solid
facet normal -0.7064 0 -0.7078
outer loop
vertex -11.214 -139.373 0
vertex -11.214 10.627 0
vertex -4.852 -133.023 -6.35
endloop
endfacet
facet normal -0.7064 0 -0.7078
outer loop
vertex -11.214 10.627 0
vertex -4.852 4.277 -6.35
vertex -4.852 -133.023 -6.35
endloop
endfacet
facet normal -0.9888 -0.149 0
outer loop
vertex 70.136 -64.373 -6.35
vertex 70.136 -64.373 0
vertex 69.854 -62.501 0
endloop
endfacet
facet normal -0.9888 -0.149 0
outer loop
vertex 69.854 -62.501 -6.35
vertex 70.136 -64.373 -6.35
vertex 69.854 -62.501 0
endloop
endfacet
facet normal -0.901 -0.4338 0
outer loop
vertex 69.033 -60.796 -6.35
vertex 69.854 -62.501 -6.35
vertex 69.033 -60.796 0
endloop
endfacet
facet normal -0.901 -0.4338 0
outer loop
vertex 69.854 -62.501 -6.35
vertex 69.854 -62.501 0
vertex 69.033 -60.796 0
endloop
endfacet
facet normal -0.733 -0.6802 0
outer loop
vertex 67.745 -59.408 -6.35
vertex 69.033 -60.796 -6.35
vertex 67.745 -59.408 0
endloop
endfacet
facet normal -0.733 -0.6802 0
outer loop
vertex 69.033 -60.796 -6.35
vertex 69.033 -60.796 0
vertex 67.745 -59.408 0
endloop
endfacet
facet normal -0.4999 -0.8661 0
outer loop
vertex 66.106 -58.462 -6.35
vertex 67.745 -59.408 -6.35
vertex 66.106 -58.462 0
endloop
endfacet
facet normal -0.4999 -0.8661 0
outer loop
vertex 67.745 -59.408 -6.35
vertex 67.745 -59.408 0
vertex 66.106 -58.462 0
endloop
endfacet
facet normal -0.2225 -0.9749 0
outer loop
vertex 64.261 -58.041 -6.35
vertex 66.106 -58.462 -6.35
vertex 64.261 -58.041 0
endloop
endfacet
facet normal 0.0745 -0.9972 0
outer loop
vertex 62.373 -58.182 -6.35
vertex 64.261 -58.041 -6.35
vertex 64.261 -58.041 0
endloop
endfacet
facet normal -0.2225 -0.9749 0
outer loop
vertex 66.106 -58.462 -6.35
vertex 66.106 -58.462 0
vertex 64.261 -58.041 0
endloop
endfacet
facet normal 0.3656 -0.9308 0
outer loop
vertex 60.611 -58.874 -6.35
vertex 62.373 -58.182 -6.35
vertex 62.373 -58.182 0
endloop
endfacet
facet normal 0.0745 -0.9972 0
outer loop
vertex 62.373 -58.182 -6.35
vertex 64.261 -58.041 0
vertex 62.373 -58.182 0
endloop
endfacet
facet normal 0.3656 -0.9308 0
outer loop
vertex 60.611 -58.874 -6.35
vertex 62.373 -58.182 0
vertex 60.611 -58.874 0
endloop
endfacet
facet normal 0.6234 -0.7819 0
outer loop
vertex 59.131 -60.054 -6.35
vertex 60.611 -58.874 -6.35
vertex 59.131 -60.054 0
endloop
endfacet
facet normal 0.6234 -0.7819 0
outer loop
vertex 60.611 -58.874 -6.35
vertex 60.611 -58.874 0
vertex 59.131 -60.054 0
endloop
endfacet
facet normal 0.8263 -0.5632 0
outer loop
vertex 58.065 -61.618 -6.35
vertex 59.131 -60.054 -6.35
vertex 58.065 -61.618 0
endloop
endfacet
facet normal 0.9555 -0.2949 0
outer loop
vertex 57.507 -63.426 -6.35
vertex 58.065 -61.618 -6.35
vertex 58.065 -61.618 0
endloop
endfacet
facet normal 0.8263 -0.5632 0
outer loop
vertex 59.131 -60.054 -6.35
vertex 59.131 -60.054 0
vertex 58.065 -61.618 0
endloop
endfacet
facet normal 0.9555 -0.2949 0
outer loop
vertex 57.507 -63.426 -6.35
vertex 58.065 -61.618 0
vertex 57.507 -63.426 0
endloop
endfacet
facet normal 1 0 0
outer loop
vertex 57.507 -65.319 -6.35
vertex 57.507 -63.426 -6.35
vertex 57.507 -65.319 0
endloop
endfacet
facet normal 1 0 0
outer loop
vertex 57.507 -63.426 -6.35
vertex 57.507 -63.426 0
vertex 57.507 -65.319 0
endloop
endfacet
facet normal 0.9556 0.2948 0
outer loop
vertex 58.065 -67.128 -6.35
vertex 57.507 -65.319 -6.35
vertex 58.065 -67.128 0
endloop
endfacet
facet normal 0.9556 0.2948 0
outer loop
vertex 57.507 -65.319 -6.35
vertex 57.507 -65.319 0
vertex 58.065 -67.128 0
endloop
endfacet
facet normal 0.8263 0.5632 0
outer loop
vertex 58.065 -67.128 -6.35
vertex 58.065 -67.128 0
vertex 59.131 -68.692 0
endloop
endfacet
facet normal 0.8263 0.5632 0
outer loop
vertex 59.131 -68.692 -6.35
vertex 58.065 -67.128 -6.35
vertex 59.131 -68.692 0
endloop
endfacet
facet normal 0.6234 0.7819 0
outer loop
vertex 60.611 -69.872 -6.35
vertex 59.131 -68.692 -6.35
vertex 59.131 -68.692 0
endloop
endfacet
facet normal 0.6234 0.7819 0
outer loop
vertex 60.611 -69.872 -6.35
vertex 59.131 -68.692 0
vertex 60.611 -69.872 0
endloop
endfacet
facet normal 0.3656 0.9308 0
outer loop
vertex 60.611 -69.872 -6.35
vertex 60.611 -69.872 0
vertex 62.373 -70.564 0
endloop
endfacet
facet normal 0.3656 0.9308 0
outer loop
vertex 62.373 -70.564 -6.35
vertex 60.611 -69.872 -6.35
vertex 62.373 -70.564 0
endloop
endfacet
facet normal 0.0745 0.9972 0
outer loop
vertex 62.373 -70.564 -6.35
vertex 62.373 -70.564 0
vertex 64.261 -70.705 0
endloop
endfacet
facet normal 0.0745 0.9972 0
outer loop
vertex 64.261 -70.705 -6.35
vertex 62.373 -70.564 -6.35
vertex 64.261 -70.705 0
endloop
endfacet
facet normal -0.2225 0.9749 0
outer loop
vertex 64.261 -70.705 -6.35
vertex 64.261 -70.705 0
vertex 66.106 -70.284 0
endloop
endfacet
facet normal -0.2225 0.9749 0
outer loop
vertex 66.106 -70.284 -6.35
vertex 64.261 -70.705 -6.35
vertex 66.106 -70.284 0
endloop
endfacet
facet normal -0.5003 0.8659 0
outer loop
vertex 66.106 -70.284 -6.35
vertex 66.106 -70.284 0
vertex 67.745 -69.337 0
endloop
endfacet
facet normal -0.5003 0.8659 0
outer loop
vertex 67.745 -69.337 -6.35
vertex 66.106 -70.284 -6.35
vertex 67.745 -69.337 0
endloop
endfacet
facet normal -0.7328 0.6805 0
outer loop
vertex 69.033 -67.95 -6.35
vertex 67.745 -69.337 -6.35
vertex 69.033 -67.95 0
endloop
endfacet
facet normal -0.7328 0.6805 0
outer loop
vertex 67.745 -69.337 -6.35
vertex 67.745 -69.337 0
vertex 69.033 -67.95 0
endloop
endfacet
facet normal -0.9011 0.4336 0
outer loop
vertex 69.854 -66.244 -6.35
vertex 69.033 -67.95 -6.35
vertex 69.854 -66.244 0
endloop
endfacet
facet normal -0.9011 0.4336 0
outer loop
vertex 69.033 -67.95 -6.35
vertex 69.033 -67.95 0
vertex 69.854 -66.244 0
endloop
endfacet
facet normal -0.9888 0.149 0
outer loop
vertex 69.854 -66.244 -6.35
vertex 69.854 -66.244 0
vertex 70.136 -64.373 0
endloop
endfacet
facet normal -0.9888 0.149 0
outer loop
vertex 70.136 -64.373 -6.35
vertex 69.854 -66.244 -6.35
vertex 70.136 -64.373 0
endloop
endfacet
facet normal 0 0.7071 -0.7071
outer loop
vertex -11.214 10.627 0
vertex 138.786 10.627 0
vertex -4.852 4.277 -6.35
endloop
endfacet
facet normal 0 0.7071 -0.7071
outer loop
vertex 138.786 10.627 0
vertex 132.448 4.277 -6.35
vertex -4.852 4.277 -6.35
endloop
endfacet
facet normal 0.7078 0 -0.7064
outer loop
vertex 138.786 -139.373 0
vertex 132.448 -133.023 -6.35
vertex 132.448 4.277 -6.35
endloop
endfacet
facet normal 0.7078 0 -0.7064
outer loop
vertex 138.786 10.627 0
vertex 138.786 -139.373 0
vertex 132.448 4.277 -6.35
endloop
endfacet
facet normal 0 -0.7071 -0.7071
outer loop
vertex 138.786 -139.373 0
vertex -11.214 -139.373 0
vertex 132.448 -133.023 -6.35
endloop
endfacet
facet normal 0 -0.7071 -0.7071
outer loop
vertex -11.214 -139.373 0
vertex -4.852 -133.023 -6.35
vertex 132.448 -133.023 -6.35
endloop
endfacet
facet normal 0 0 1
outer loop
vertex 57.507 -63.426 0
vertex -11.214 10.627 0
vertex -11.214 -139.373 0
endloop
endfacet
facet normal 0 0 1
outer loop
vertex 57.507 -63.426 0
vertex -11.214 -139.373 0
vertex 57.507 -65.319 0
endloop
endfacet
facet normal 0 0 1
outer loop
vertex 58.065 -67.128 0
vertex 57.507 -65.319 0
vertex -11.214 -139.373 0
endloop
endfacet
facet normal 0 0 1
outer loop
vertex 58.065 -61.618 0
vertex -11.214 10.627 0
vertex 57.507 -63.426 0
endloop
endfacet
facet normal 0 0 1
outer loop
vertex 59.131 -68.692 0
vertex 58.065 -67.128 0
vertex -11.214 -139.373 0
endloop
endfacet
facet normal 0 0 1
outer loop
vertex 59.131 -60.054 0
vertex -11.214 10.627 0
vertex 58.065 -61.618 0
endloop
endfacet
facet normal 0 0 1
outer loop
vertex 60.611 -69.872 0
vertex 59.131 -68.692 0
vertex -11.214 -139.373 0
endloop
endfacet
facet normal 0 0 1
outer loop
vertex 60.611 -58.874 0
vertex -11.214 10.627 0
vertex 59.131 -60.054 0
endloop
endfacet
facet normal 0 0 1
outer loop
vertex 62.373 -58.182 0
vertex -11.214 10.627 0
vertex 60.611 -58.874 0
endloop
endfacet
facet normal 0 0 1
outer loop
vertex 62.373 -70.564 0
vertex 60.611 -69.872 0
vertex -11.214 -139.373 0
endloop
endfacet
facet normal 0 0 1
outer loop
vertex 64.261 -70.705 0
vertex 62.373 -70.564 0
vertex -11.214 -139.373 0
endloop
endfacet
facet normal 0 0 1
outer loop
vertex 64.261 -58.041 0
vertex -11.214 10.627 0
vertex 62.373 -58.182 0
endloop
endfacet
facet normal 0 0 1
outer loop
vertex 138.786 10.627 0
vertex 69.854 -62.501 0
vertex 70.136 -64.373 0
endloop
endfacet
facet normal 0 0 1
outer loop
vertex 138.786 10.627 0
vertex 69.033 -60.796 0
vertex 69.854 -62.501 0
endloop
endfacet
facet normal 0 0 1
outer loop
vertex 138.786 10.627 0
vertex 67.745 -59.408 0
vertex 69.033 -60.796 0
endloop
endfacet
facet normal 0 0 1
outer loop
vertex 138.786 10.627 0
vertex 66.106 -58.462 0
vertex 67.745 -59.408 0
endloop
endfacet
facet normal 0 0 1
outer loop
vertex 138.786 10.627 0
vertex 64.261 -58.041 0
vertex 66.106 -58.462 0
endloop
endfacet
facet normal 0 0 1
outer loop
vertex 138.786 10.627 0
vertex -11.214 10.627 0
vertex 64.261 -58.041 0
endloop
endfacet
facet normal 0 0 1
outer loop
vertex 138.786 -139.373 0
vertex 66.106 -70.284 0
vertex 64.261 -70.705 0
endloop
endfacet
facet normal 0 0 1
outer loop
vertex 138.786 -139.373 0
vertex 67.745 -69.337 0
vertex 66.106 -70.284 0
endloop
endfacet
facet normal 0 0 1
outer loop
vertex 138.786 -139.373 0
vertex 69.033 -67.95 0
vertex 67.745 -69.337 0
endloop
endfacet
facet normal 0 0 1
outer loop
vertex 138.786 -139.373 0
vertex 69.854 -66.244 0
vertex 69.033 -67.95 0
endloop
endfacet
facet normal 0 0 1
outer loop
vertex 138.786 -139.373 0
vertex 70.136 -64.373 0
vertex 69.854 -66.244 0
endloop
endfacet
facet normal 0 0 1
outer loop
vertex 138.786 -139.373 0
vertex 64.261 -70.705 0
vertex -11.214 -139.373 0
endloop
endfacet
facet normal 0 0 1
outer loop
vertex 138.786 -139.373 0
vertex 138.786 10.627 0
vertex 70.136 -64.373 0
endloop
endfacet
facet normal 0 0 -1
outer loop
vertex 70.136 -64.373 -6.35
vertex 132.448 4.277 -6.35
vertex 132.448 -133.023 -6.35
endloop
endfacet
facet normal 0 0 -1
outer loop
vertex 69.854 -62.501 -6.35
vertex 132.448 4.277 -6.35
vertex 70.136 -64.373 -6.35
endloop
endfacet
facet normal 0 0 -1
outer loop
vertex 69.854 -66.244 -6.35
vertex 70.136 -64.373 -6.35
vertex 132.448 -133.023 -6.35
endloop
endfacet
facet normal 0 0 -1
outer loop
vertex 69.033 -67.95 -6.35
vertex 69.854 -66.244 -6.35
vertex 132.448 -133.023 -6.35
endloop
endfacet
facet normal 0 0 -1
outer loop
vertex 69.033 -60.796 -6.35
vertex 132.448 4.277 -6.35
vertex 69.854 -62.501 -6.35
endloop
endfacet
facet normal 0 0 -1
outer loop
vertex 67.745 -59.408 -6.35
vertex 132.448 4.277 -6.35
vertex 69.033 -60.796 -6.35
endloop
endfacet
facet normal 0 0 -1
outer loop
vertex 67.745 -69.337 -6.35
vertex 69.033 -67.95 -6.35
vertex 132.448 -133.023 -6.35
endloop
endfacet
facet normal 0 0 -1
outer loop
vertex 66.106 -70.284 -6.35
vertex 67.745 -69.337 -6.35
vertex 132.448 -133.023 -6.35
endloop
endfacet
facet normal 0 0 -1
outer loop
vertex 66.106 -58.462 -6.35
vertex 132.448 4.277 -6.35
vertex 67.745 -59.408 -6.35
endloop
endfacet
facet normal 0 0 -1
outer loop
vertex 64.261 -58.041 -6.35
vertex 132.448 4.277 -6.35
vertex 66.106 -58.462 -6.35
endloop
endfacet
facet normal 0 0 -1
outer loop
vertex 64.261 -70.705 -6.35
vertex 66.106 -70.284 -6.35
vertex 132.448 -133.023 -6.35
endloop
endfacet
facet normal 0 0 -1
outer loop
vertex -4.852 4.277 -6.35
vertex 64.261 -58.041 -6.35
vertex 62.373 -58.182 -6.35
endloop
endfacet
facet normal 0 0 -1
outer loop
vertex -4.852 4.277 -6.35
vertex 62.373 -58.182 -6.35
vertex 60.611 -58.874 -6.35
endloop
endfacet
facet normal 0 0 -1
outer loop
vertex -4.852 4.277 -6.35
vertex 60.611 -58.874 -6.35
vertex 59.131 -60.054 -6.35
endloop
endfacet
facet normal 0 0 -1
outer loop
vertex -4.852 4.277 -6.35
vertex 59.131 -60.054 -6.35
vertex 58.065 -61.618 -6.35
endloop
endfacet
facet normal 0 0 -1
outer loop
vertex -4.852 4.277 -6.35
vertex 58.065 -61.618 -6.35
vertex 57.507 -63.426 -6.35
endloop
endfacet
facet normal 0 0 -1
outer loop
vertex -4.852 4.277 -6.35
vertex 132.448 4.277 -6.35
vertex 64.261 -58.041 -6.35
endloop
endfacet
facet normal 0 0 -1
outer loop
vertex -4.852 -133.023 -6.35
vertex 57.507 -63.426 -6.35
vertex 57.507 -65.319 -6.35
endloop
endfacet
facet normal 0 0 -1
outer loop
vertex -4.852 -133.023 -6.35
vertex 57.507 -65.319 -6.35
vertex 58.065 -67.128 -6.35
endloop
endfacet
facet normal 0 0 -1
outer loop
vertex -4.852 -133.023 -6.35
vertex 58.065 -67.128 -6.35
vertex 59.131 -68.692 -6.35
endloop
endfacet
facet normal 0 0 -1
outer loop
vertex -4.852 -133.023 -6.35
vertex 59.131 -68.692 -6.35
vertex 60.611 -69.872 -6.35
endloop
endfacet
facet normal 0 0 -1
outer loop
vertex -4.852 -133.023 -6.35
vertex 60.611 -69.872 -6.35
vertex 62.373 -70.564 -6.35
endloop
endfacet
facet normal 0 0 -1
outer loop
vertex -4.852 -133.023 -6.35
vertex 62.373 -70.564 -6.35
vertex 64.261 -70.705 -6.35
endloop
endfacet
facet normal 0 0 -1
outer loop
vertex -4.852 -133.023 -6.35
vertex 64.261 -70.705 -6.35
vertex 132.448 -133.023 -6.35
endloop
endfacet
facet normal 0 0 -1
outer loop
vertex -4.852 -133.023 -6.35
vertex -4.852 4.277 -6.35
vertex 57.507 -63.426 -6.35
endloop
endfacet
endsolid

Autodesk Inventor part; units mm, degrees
ref_plane "YZ Plane" through (0, 0, 0) normal (1, 0, 0) x (0, 1, 0)
ref_plane "XZ Plane" through (0, 0, 0) normal (0, 1, 0) x (-1, 0, 0)
ref_plane "XY Plane" through (0, 0, 0) normal (0, 0, 1) x (1, 0, 0)
sketch "Sketch1" plane through (0, 0, 0) normal (0, 0, 1) x (1, 0, 0)
  line L0 (-11.214, 10.6272) -> (138.786, 10.6272)
  line L1 (138.786, 10.6272) -> (138.786, -139.3728)
  line L2 (138.786, -139.3728) -> (-11.214, -139.3728)
  line L3 (-11.214, -139.3728) -> (-11.214, 10.6272)
  point P0 (0, 0)
  dimension "d0" = 150
  dimension "d1" = 150
ref_plane "Work Plane2" through (-11.214, 10.6272, -6.35) normal (0, 0, -1) x (1, 0, 0)
ref_plane "Work Plane1" through (-11.214, 10.6272, 0) normal (0, 0, -1) x (1, 0, 0)
sketch "Sketch2" plane through (-11.214, 10.6272, -6.35) normal (0, 0, -1) x (1, 0, 0)
  line L0 (143.6624, 6.35) -> (6.3624, 6.35)
  line L1 (6.3624, 6.35) -> (6.3624, 143.65)
  line L2 (6.3624, 143.65) -> (143.6624, 143.65)
  line L3 (143.6624, 143.65) -> (143.6624, 6.35)
  line L4 (150, 0) -> (0, 0) construction
  line L5 (0, 0) -> (0, 150) construction
  point P0 (11.214, 10.6272)
  dimension "d3" = 137.3
  dimension "d4" = 137.3
  dimension "d6" = 6.35
  dimension "d7" = 143.6624
loft "Loft1" add profiles "Sketch1", "Sketch2"
sketch "Sketch3" plane through (-11.214, 10.6272, 0) normal (0, 0, 1) x (1, 0, 0)
  line L0 (0, 0) -> (6.3624, -6.35) projected
  line L1 (150, 0) -> (150, -150) projected
  line L2 (0, 0) -> (150, -150) construction
  line L3 (0, -150) -> (6.3624, -143.65) projected
  line L4 (0, -150) -> (150, 0) construction
  circle A0 centre (75, -75) radius 6.35
  point P0 (11.214, -10.6272)
  dimension "d12" = 12.7
extrude "Extrusion1" cut sketch "Sketch3" against normal blind 25.4
properties part number "insulationlid"
